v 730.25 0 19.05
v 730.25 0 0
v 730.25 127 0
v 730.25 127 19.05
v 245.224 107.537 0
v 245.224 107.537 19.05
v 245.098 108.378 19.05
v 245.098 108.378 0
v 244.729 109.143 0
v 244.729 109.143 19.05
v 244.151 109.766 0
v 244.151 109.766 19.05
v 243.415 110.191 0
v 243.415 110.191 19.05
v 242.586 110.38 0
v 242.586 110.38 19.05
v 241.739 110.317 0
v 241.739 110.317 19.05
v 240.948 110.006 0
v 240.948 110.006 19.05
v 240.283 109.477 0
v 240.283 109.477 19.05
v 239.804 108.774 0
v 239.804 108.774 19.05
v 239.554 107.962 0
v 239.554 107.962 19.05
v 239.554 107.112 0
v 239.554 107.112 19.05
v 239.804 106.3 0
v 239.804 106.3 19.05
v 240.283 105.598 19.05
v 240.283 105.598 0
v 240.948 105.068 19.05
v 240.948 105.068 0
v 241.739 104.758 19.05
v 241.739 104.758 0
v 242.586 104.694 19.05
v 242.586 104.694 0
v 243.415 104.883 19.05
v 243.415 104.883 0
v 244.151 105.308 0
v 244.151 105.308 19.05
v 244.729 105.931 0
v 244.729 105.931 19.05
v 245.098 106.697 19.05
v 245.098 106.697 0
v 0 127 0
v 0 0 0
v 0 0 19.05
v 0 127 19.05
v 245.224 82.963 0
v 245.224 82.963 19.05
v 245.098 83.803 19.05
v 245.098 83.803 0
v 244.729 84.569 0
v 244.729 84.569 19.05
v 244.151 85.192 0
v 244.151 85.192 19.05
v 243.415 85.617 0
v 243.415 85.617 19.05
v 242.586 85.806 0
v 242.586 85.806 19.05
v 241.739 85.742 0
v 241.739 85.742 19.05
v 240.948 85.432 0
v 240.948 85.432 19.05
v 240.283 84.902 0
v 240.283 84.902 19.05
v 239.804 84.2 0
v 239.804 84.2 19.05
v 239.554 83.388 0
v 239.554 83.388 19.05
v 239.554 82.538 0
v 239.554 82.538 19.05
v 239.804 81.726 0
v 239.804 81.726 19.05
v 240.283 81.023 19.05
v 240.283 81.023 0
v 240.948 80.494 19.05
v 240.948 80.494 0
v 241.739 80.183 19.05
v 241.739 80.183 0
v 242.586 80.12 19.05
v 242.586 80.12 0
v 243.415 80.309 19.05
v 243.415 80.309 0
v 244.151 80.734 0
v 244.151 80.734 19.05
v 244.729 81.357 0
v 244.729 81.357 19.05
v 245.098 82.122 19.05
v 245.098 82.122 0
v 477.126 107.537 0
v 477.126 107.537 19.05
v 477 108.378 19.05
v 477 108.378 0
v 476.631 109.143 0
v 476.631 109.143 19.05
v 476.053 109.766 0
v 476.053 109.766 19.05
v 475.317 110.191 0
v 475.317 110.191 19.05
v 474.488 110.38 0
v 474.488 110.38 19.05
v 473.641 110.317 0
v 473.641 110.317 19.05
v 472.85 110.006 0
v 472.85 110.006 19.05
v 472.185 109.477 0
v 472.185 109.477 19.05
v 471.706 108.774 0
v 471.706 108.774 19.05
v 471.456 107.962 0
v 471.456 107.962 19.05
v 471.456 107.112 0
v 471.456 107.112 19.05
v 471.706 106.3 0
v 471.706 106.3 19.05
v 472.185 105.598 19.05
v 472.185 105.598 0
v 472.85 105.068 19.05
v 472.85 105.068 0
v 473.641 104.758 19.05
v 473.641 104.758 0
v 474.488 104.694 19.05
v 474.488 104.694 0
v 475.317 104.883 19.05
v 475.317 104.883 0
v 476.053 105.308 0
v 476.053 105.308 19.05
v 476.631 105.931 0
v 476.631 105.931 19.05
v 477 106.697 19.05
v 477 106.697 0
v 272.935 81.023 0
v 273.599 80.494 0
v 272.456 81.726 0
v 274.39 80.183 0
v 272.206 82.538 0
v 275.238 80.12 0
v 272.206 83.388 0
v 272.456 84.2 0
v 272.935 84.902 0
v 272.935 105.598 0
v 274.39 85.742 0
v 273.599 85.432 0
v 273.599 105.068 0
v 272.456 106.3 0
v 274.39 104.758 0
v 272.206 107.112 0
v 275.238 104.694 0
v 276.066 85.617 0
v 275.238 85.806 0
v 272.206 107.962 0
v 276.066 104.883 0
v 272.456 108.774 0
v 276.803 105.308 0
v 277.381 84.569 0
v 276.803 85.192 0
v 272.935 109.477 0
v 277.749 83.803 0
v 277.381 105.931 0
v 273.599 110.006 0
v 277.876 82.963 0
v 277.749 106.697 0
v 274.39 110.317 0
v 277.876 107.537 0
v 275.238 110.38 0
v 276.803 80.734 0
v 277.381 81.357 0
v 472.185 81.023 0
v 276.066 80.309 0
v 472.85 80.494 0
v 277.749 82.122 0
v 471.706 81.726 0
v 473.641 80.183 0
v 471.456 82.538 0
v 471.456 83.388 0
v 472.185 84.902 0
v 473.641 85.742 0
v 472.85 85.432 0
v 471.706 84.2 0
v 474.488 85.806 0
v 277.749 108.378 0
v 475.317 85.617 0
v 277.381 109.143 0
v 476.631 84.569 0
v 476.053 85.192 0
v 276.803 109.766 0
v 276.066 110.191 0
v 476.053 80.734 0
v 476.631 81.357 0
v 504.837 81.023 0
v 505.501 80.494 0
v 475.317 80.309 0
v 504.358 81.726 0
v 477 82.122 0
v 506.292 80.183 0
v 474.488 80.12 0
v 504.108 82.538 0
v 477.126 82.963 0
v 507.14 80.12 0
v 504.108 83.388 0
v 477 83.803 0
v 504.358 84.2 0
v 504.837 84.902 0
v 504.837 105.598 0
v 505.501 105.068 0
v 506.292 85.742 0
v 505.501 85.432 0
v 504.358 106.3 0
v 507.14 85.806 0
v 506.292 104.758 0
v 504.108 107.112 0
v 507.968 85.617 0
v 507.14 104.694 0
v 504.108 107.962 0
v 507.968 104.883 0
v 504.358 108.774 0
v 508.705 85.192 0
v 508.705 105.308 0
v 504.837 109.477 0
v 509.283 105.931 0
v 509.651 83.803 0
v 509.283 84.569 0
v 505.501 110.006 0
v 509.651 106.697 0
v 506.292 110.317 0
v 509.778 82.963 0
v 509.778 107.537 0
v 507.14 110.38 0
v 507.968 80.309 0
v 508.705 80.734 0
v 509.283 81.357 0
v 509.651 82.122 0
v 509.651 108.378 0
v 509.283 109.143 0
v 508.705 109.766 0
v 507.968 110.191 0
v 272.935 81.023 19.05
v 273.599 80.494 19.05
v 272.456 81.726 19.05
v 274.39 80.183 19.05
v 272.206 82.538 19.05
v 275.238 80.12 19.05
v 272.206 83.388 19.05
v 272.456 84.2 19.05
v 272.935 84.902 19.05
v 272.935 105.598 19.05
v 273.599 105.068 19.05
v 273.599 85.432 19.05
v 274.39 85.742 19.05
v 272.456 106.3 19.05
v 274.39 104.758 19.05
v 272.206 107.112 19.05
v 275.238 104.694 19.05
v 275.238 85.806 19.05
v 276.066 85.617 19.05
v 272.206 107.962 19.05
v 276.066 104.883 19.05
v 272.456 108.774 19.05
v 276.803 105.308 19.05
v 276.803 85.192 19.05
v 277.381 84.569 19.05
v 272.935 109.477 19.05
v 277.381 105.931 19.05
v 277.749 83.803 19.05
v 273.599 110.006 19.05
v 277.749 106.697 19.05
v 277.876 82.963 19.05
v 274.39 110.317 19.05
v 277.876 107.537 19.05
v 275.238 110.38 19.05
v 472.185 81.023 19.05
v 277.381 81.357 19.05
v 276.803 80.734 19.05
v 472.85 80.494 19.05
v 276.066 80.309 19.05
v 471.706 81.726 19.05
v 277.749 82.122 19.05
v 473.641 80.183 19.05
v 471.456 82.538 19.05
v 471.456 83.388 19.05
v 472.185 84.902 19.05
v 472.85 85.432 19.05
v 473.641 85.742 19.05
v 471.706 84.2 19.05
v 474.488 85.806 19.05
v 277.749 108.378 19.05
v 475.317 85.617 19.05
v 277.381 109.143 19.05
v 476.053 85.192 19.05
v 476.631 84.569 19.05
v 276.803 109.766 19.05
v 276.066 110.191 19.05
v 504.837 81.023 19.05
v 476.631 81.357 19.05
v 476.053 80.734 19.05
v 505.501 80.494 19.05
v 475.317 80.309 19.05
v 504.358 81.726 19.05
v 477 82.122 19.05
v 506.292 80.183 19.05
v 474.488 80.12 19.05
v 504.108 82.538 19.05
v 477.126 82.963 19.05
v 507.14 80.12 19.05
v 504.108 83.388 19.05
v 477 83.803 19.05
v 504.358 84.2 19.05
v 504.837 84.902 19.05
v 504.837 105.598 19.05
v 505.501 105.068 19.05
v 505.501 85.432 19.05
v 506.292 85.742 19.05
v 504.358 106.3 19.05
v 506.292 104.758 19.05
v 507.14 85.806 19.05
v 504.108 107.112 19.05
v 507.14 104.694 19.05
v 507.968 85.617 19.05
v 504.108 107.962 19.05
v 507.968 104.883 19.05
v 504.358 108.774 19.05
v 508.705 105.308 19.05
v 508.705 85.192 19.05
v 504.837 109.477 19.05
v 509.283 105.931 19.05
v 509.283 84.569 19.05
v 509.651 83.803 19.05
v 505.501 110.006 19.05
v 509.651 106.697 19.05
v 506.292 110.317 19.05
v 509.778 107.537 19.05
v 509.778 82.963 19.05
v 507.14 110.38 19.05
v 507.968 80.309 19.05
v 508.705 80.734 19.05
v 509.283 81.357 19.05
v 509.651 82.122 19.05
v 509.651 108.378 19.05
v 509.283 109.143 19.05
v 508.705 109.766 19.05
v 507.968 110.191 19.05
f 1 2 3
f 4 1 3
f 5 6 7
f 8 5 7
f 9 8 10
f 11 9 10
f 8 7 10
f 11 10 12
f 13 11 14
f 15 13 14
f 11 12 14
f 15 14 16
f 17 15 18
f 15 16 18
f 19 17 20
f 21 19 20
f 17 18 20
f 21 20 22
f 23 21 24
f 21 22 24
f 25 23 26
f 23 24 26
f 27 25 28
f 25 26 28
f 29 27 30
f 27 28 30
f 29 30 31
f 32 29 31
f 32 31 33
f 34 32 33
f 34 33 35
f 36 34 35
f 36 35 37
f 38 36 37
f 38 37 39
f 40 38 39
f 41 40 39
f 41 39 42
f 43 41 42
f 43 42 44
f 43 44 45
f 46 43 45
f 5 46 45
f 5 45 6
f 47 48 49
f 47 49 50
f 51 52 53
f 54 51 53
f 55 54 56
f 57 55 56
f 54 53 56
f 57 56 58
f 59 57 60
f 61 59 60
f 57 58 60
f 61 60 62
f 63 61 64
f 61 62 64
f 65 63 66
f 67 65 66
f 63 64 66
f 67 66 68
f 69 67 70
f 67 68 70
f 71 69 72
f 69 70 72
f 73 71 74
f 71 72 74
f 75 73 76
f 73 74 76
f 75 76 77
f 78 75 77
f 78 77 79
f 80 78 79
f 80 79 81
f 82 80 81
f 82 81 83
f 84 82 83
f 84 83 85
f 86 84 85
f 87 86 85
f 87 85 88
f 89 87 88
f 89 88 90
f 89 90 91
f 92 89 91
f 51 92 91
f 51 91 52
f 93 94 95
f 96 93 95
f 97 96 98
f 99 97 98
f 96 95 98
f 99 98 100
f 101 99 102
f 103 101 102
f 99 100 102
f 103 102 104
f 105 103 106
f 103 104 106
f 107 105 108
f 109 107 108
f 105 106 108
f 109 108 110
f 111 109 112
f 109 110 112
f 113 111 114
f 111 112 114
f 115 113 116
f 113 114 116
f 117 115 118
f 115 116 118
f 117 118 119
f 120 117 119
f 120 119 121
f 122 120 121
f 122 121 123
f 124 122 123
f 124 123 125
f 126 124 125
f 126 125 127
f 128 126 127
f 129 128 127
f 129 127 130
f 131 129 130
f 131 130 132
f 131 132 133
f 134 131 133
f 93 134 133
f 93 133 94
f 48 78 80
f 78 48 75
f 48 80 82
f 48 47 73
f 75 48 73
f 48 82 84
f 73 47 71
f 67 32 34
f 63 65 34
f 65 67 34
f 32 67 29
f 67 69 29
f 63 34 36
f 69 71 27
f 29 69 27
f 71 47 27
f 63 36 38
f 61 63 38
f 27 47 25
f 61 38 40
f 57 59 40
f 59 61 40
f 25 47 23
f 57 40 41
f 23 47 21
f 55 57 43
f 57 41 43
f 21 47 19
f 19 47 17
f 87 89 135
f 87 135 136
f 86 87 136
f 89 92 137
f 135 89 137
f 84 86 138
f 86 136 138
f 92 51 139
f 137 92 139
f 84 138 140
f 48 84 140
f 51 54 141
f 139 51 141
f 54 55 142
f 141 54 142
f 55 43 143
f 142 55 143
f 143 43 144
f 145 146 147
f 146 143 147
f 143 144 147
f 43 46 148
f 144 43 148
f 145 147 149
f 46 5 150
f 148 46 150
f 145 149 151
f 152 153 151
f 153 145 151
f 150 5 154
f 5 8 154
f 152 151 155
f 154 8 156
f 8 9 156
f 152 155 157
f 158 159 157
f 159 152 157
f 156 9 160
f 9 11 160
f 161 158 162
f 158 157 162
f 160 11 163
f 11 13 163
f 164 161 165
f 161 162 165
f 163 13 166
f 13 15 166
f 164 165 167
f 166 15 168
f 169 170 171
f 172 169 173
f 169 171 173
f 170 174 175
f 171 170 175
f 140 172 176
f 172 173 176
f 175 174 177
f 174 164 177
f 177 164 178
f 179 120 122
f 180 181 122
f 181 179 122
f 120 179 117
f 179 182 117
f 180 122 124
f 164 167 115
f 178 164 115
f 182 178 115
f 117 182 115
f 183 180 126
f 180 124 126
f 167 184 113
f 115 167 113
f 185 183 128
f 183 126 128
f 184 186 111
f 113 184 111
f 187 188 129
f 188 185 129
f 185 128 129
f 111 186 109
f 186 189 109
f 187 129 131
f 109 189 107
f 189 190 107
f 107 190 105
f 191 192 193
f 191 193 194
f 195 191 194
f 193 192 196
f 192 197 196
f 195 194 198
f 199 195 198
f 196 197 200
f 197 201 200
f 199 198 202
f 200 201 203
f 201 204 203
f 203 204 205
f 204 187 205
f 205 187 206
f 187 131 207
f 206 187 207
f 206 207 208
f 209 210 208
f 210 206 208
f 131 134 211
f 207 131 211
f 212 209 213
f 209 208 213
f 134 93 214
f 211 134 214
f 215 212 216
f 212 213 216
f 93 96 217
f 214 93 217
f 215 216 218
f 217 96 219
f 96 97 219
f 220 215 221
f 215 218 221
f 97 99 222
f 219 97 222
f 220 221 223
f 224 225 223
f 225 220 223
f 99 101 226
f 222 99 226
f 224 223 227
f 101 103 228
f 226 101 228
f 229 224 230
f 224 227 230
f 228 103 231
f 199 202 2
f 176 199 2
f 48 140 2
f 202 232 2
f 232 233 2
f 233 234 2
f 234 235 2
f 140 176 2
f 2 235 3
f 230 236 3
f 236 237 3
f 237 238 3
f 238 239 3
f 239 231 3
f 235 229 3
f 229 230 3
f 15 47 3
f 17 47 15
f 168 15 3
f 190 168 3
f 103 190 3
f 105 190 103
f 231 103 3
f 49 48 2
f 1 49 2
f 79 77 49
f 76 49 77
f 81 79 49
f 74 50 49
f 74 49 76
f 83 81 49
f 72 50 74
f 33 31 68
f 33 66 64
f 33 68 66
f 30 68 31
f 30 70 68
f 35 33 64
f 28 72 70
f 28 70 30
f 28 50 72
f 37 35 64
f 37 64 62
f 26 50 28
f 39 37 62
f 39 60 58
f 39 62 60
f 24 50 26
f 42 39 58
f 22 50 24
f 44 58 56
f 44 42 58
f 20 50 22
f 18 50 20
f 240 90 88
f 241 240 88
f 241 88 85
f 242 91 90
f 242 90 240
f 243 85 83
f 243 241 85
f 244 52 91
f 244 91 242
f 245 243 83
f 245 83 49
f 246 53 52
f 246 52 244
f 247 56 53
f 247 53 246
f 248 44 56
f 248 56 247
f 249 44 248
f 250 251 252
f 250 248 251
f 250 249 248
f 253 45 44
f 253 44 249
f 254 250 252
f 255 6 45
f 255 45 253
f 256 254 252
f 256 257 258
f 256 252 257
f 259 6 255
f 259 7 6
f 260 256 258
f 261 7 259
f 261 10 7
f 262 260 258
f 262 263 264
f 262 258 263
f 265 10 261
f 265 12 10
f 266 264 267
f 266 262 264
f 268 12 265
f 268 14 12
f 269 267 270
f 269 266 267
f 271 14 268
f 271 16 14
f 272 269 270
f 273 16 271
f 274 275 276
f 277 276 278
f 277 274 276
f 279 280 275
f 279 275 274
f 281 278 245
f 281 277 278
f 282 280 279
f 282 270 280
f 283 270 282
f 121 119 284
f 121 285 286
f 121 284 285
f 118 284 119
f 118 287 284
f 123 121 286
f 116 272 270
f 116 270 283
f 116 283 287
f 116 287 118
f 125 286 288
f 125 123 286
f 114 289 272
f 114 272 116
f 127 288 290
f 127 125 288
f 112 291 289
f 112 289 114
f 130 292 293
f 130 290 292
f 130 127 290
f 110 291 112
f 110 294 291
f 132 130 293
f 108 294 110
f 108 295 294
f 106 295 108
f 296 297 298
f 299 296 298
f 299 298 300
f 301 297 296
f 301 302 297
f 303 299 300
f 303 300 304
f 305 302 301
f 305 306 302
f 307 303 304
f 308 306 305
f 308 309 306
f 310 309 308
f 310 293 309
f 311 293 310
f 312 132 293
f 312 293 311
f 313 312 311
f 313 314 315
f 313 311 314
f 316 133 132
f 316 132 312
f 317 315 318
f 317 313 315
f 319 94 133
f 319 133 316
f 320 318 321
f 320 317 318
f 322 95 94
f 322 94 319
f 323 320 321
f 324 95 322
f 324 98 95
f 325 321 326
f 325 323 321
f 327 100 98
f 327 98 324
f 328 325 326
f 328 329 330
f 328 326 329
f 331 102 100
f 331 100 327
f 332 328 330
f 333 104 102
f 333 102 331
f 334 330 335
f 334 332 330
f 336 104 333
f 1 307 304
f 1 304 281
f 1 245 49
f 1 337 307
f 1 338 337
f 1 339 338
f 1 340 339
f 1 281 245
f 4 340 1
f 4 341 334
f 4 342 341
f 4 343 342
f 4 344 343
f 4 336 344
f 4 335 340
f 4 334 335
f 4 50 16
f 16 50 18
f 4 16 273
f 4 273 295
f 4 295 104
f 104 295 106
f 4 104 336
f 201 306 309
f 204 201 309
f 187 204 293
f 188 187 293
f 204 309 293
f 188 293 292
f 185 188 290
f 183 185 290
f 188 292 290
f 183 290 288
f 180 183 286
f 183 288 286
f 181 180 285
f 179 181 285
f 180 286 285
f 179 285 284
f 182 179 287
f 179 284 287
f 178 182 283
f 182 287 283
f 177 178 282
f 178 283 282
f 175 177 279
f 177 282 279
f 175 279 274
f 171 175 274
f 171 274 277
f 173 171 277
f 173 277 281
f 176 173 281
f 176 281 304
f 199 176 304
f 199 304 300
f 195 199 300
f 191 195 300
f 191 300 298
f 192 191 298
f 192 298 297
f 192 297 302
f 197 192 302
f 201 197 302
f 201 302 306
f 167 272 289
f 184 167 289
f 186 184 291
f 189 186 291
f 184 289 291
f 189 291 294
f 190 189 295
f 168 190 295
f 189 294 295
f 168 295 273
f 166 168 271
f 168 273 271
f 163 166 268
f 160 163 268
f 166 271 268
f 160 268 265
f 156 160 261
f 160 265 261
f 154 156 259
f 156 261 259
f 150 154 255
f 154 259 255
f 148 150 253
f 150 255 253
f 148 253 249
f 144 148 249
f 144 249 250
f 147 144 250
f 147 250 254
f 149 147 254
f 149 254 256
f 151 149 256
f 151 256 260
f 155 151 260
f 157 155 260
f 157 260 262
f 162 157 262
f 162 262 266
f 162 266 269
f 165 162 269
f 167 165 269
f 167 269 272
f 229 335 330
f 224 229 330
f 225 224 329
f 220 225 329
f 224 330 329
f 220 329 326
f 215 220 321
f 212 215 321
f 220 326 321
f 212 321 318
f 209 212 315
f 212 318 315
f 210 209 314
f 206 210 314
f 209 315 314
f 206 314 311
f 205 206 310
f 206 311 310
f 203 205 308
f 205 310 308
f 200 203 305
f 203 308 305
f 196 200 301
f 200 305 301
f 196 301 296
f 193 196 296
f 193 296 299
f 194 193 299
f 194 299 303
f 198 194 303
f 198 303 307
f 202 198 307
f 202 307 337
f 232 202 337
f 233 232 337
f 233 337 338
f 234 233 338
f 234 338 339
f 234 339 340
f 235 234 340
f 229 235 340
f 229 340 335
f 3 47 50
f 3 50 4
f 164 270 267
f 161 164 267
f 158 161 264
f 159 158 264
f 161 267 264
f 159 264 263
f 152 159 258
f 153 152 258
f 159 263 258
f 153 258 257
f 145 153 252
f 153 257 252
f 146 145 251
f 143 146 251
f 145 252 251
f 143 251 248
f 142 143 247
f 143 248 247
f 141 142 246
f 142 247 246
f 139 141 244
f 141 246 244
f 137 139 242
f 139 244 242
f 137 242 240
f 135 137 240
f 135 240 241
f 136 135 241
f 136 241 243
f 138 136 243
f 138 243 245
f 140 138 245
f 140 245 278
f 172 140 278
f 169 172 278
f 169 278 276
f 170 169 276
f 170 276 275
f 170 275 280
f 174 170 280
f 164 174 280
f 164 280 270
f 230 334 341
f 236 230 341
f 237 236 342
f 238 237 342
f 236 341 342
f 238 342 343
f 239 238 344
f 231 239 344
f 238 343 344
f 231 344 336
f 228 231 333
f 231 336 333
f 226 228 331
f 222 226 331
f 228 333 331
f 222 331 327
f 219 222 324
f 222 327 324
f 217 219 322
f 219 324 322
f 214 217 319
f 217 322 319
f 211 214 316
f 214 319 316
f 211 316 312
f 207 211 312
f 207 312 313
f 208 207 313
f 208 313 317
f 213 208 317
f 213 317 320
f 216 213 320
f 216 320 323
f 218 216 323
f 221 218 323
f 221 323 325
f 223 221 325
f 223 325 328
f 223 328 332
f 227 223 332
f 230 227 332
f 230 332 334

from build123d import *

# Parameters (mm, degrees)
SKETCH1_W           = 730.25
SKETCH1_H           = 127
BOSS_EXTRUDE1_DEPTH = 19.05
CUT_EXTRUDE1_REACH  = 21.05
SKETCH2_R           = 2.85115


with BuildPart() as part:
    # Sketch1 → Boss-Extrude1 (new body)
    with BuildSketch(Plane.XY):
        with Locations((365.125, 63.5)):
            Rectangle(SKETCH1_W, SKETCH1_H)
    extrude(amount=BOSS_EXTRUDE1_DEPTH)

    # Sketch2 → Cut-Extrude1 (cut, up to next)
    with BuildSketch(Plane.XY.offset(19.05), mode=Mode.PRIVATE) as cut_extrude1_sk1:
        with Locations((242.37315, 82.96275)):
            Circle(SKETCH2_R)
    cut_extrude1_tool1 = extrude(cut_extrude1_sk1.sketch, amount=-CUT_EXTRUDE1_REACH, mode=Mode.PRIVATE) & part.part
    add(cut_extrude1_tool1.solids().sort_by_distance((242.37315, 82.96275, 19.05))[0], mode=Mode.SUBTRACT)
    # Sketch2 → Cut-Extrude1 (cut, up to next)
    with BuildSketch(Plane.XY.offset(19.05), mode=Mode.PRIVATE) as cut_extrude1_sk2:
        with Locations((242.37315, 107.53725)):
            Circle(SKETCH2_R)
    cut_extrude1_tool2 = extrude(cut_extrude1_sk2.sketch, amount=-CUT_EXTRUDE1_REACH, mode=Mode.PRIVATE) & part.part
    add(cut_extrude1_tool2.solids().sort_by_distance((242.37315, 107.53725, 19.05))[0], mode=Mode.SUBTRACT)
    # Sketch2 → Cut-Extrude1 (cut, up to next)
    with BuildSketch(Plane.XY.offset(19.05), mode=Mode.PRIVATE) as cut_extrude1_sk3:
        with Locations((275.02485, 107.53725)):
            Circle(SKETCH2_R)
    cut_extrude1_tool3 = extrude(cut_extrude1_sk3.sketch, amount=-CUT_EXTRUDE1_REACH, mode=Mode.PRIVATE) & part.part
    add(cut_extrude1_tool3.solids().sort_by_distance((275.02485, 107.53725, 19.05))[0], mode=Mode.SUBTRACT)
    # Sketch2 → Cut-Extrude1 (cut, up to next)
    with BuildSketch(Plane.XY.offset(19.05), mode=Mode.PRIVATE) as cut_extrude1_sk4:
        with Locations((275.02485, 82.96275)):
            Circle(SKETCH2_R)
    cut_extrude1_tool4 = extrude(cut_extrude1_sk4.sketch, amount=-CUT_EXTRUDE1_REACH, mode=Mode.PRIVATE) & part.part
    add(cut_extrude1_tool4.solids().sort_by_distance((275.02485, 82.96275, 19.05))[0], mode=Mode.SUBTRACT)
    # Sketch2 → Cut-Extrude1 (cut, up to next)
    with BuildSketch(Plane.XY.offset(19.05), mode=Mode.PRIVATE) as cut_extrude1_sk5:
        with Locations((474.27515, 82.96275)):
            Circle(SKETCH2_R)
    cut_extrude1_tool5 = extrude(cut_extrude1_sk5.sketch, amount=-CUT_EXTRUDE1_REACH, mode=Mode.PRIVATE) & part.part
    add(cut_extrude1_tool5.solids().sort_by_distance((474.27515, 82.96275, 19.05))[0], mode=Mode.SUBTRACT)
    # Sketch2 → Cut-Extrude1 (cut, up to next)
    with BuildSketch(Plane.XY.offset(19.05), mode=Mode.PRIVATE) as cut_extrude1_sk6:
        with Locations((474.27515, 107.53725)):
            Circle(SKETCH2_R)
    cut_extrude1_tool6 = extrude(cut_extrude1_sk6.sketch, amount=-CUT_EXTRUDE1_REACH, mode=Mode.PRIVATE) & part.part
    add(cut_extrude1_tool6.solids().sort_by_distance((474.27515, 107.53725, 19.05))[0], mode=Mode.SUBTRACT)
    # Sketch2 → Cut-Extrude1 (cut, up to next)
    with BuildSketch(Plane.XY.offset(19.05), mode=Mode.PRIVATE) as cut_extrude1_sk7:
        with Locations((506.92685, 107.53725)):
            Circle(SKETCH2_R)
    cut_extrude1_tool7 = extrude(cut_extrude1_sk7.sketch, amount=-CUT_EXTRUDE1_REACH, mode=Mode.PRIVATE) & part.part
    add(cut_extrude1_tool7.solids().sort_by_distance((506.92685, 107.53725, 19.05))[0], mode=Mode.SUBTRACT)
    # Sketch2 → Cut-Extrude1 (cut, up to next)
    with BuildSketch(Plane.XY.offset(19.05), mode=Mode.PRIVATE) as cut_extrude1_sk8:
        with Locations((506.92685, 82.96275)):
            Circle(SKETCH2_R)
    cut_extrude1_tool8 = extrude(cut_extrude1_sk8.sketch, amount=-CUT_EXTRUDE1_REACH, mode=Mode.PRIVATE) & part.part
    add(cut_extrude1_tool8.solids().sort_by_distance((506.92685, 82.96275, 19.05))[0], mode=Mode.SUBTRACT)


solid = part.part
